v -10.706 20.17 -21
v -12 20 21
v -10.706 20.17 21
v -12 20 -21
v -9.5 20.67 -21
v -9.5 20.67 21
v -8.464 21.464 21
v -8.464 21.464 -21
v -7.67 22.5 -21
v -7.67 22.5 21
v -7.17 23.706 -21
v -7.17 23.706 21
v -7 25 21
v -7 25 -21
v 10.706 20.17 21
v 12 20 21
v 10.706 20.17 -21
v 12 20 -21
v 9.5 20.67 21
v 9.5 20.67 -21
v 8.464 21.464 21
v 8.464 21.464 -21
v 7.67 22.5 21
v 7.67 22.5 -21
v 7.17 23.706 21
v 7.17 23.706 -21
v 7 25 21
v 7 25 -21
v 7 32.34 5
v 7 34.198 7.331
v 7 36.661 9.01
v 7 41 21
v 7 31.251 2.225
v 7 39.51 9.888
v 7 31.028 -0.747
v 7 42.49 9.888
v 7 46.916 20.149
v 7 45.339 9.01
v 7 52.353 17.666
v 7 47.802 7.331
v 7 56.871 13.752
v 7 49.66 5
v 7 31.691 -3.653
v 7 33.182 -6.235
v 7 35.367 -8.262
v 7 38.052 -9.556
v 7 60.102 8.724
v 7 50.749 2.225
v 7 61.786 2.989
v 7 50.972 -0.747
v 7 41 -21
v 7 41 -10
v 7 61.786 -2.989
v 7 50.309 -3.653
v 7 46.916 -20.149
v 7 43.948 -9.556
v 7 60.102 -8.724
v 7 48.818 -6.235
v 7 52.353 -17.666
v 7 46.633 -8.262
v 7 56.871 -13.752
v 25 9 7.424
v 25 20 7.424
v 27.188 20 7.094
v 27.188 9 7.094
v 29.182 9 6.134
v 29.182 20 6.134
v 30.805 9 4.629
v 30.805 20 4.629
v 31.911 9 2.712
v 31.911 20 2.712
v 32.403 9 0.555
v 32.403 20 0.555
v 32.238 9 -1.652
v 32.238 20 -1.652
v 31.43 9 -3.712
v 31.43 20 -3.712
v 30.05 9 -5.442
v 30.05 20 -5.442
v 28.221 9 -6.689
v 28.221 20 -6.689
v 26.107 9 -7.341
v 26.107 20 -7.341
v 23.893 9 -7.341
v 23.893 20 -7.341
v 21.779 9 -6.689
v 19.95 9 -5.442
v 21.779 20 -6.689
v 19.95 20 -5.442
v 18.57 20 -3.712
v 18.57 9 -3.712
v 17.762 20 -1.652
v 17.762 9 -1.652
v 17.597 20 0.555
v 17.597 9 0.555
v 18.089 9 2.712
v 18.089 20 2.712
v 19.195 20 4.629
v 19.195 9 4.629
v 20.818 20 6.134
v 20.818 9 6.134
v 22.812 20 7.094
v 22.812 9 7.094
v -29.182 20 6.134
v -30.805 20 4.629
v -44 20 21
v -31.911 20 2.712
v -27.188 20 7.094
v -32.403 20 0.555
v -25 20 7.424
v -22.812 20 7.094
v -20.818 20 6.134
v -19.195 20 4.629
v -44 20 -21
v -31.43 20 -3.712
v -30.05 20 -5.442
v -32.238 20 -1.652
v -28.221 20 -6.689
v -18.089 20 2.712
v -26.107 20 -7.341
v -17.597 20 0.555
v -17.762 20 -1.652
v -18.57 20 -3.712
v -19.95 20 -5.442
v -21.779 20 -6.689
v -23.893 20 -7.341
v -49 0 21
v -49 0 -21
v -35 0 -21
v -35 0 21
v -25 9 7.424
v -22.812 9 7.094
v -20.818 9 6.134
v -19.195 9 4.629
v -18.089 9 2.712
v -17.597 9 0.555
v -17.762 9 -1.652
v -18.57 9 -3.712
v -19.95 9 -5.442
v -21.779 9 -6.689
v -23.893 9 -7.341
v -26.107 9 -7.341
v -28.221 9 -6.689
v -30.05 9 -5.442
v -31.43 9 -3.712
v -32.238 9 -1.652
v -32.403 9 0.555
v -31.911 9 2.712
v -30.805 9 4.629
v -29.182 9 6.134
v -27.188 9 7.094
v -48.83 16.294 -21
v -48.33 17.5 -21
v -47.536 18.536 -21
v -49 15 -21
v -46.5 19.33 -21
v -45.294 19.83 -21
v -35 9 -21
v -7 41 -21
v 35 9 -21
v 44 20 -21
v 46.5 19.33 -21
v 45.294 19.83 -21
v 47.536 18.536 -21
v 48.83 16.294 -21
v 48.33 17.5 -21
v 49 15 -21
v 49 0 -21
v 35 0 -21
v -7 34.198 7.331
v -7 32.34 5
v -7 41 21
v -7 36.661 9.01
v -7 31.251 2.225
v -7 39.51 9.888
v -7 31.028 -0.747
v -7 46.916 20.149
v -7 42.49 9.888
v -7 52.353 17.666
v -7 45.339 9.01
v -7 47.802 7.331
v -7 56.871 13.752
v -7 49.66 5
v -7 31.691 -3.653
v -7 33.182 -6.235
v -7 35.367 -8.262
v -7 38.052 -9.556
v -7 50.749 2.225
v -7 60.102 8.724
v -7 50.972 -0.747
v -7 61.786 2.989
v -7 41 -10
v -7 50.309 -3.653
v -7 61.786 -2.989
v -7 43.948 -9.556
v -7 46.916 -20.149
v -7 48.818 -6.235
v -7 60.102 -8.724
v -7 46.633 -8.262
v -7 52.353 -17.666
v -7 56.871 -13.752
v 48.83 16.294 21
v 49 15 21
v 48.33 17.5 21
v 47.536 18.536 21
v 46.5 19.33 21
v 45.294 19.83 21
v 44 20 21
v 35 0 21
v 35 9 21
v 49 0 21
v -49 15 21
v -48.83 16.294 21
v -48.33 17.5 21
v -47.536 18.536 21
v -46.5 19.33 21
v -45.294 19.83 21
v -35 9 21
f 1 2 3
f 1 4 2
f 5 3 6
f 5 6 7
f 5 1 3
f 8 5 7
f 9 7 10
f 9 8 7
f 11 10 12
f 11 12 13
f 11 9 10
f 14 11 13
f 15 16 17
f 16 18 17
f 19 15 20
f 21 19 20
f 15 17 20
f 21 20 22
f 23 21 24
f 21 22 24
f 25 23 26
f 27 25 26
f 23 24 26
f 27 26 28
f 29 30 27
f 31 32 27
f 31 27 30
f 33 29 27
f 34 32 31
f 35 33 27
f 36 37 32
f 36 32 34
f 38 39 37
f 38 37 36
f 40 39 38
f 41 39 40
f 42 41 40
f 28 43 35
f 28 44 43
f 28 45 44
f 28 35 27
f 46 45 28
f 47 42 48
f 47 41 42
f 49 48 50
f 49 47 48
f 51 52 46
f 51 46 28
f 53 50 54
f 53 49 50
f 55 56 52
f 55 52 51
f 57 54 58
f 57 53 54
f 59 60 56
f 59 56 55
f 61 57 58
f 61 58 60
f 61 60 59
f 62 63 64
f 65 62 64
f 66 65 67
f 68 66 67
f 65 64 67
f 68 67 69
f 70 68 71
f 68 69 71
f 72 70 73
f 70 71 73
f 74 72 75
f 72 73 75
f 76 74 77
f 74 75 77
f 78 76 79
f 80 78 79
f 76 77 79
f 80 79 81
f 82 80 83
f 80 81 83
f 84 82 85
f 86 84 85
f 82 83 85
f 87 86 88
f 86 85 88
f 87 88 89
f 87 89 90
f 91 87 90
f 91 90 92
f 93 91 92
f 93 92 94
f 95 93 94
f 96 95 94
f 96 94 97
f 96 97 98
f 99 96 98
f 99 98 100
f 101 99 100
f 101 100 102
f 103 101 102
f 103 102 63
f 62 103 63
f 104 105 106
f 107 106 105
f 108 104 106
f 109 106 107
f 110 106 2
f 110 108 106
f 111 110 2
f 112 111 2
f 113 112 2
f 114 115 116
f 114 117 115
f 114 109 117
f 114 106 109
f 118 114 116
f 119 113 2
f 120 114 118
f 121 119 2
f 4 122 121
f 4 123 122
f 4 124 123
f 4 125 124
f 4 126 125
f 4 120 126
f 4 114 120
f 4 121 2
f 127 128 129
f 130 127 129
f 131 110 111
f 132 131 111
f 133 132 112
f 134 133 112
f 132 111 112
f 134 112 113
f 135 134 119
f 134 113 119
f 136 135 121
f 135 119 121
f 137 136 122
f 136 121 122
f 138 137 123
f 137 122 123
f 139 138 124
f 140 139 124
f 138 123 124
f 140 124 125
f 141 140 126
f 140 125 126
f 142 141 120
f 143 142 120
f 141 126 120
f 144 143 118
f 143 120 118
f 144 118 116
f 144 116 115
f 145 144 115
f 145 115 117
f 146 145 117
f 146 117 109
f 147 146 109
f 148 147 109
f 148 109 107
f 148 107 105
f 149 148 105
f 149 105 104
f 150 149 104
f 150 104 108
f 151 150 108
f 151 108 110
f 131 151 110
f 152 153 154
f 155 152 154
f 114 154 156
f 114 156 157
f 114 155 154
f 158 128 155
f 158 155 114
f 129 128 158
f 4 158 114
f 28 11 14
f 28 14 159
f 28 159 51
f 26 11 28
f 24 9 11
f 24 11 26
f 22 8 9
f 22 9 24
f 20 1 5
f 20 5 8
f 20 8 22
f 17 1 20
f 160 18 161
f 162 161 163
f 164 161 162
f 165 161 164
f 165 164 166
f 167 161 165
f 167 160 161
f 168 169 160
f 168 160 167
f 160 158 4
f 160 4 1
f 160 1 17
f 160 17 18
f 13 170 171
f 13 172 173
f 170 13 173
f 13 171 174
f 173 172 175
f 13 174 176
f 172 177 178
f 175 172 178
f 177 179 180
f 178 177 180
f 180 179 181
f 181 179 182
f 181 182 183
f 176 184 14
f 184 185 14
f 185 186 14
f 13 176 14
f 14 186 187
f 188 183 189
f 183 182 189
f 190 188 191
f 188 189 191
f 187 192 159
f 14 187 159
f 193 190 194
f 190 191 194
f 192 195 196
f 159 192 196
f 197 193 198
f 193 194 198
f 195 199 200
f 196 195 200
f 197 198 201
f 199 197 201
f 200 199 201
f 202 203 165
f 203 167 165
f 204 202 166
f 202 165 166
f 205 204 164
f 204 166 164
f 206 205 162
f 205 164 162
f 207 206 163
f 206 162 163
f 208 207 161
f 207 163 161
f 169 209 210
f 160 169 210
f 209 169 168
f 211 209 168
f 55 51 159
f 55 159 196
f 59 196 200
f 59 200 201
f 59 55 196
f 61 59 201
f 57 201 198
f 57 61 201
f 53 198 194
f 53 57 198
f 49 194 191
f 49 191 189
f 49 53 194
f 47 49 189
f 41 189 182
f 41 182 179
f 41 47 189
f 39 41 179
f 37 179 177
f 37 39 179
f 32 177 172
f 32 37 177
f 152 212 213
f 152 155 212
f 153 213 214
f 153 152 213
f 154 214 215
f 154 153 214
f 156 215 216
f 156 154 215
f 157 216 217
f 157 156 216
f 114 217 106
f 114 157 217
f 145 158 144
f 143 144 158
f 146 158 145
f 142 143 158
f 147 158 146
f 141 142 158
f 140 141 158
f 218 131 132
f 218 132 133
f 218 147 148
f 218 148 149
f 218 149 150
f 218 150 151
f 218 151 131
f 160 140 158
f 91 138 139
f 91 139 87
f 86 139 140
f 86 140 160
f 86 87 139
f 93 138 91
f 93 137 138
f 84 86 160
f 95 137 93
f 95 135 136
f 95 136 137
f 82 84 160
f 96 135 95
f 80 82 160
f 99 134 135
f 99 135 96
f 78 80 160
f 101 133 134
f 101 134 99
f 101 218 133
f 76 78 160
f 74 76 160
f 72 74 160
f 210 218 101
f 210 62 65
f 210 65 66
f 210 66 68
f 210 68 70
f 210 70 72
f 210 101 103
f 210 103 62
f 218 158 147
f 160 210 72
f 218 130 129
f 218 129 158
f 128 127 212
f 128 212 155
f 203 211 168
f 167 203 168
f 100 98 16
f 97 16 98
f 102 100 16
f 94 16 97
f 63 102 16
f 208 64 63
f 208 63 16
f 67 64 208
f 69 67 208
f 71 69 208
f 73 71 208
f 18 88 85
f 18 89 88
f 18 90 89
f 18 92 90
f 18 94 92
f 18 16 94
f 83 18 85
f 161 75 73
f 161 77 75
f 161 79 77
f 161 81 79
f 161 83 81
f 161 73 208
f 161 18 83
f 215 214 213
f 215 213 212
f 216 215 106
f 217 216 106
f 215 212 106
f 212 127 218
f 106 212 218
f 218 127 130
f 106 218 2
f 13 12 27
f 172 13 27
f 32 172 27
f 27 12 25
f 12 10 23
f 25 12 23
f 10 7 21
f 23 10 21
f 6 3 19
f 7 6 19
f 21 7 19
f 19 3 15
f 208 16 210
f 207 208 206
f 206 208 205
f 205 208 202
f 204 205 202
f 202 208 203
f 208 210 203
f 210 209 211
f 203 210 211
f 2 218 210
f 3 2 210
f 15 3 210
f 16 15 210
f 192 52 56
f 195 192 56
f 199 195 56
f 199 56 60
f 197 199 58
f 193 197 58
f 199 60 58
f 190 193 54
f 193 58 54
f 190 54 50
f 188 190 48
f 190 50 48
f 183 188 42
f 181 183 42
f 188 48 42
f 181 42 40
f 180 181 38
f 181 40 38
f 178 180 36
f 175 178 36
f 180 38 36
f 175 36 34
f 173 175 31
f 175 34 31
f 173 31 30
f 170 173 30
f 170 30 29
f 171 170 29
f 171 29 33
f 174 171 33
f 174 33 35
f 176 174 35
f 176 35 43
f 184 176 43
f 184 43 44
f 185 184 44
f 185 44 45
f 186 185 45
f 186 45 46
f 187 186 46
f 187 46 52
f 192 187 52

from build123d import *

# Parameters (mm, degrees)
SKETCH1_W           = 98
SKETCH1_H           = 42
BOSS_EXTRUDE1_DEPTH = 20
SKETCH2_W           = 70
SKETCH2_H           = 9
CUT_EXTRUDE1_DEPTH  = 68.564783726
SKETCH3_W           = 42
SKETCH3_H           = 42
BOSS_EXTRUDE2_DEPTH = 7
FILLET1_RADIUS      = 21
FILLET1_LENGTH      = 14
SKETCH4_R           = 10
CUT_EXTRUDE2_DEPTH  = 87.145226217
SKETCH5_R           = 7.424250223
CUT_EXTRUDE5_DEPTH  = 68.867518004
FILLET2_R           = 5


with BuildPart() as part:
    # Sketch1 → Boss-Extrude1 (new body)
    with BuildSketch(Plane(origin=(0, 0, 0), x_dir=(1, 0, 0), z_dir=(0, 1, 0))):
        Rectangle(SKETCH1_W, SKETCH1_H)
    extrude(amount=BOSS_EXTRUDE1_DEPTH)

    # Sketch2 → Cut-Extrude1 (cut, through all)
    with BuildSketch(Plane.XY.offset(21)):
        with Locations((0, 4.5)):
            Rectangle(SKETCH2_W, SKETCH2_H)
    extrude(amount=-CUT_EXTRUDE1_DEPTH, mode=Mode.SUBTRACT)

    # Sketch3 → Boss-Extrude2 (add, symmetric)
    with BuildSketch(Plane(origin=(0, 0, 0), x_dir=(0, 0, -1), z_dir=(1, 0, 0))):
        with Locations((0, 41)):
            Rectangle(SKETCH3_W, SKETCH3_H)
    extrude(amount=BOSS_EXTRUDE2_DEPTH, both=True)

    # Fillet1: full round fillet: the end face becomes a half cylinder, R = half its width
    fillet1_face = Plane((0, 62, 0), x_dir=(1, 0, 0), z_dir=(0, 1, 0))  # on the end face: x along it, z out of the body
    fillet1_slab = fillet1_face.offset(-FILLET1_RADIUS / 2) * Box(FILLET1_LENGTH, 2 * FILLET1_RADIUS, FILLET1_RADIUS, mode=Mode.PRIVATE)  # the body's end, R deep
    fillet1_round = Plane((0, 41, 0), x_dir=(0, 1, 0), z_dir=(1, 0, 0)) * Cylinder(FILLET1_RADIUS, FILLET1_LENGTH, mode=Mode.PRIVATE)  # its axis R under the face
    add(fillet1_slab - fillet1_round, mode=Mode.SUBTRACT)

    # Sketch4 → Cut-Extrude2 (cut, through all)
    with BuildSketch(Plane(origin=(7, 0, 0), x_dir=(0, 0, -1), z_dir=(1, 0, 0))):
        with Locations((0, 41)):
            Circle(SKETCH4_R)
    extrude(amount=-CUT_EXTRUDE2_DEPTH, mode=Mode.SUBTRACT)

    # Sketch5 → Cut-Extrude5 (cut, through all)
    with BuildSketch(Plane(origin=(0, 20, 0), x_dir=(1, 0, 0), z_dir=(0, 1, 0))):
        with Locations(Location((-25, 0, 0), (0, 0, 270))):
            Circle(SKETCH5_R)
        with Locations(Location((25, 0, 0), (0, 0, 270))):
            Circle(SKETCH5_R)
    extrude(amount=-CUT_EXTRUDE5_DEPTH, mode=Mode.SUBTRACT)

    # Fillet2
    fillet2_edges = [part.edges().sort_by_distance(p)[0] for p in [
        (-49, 20, 0),
        (-7, 20, 0),
        (7, 20, 0),
        (49, 20, 0),
    ]]
    fillet(fillet2_edges, radius=FILLET2_R)


solid = part.part
